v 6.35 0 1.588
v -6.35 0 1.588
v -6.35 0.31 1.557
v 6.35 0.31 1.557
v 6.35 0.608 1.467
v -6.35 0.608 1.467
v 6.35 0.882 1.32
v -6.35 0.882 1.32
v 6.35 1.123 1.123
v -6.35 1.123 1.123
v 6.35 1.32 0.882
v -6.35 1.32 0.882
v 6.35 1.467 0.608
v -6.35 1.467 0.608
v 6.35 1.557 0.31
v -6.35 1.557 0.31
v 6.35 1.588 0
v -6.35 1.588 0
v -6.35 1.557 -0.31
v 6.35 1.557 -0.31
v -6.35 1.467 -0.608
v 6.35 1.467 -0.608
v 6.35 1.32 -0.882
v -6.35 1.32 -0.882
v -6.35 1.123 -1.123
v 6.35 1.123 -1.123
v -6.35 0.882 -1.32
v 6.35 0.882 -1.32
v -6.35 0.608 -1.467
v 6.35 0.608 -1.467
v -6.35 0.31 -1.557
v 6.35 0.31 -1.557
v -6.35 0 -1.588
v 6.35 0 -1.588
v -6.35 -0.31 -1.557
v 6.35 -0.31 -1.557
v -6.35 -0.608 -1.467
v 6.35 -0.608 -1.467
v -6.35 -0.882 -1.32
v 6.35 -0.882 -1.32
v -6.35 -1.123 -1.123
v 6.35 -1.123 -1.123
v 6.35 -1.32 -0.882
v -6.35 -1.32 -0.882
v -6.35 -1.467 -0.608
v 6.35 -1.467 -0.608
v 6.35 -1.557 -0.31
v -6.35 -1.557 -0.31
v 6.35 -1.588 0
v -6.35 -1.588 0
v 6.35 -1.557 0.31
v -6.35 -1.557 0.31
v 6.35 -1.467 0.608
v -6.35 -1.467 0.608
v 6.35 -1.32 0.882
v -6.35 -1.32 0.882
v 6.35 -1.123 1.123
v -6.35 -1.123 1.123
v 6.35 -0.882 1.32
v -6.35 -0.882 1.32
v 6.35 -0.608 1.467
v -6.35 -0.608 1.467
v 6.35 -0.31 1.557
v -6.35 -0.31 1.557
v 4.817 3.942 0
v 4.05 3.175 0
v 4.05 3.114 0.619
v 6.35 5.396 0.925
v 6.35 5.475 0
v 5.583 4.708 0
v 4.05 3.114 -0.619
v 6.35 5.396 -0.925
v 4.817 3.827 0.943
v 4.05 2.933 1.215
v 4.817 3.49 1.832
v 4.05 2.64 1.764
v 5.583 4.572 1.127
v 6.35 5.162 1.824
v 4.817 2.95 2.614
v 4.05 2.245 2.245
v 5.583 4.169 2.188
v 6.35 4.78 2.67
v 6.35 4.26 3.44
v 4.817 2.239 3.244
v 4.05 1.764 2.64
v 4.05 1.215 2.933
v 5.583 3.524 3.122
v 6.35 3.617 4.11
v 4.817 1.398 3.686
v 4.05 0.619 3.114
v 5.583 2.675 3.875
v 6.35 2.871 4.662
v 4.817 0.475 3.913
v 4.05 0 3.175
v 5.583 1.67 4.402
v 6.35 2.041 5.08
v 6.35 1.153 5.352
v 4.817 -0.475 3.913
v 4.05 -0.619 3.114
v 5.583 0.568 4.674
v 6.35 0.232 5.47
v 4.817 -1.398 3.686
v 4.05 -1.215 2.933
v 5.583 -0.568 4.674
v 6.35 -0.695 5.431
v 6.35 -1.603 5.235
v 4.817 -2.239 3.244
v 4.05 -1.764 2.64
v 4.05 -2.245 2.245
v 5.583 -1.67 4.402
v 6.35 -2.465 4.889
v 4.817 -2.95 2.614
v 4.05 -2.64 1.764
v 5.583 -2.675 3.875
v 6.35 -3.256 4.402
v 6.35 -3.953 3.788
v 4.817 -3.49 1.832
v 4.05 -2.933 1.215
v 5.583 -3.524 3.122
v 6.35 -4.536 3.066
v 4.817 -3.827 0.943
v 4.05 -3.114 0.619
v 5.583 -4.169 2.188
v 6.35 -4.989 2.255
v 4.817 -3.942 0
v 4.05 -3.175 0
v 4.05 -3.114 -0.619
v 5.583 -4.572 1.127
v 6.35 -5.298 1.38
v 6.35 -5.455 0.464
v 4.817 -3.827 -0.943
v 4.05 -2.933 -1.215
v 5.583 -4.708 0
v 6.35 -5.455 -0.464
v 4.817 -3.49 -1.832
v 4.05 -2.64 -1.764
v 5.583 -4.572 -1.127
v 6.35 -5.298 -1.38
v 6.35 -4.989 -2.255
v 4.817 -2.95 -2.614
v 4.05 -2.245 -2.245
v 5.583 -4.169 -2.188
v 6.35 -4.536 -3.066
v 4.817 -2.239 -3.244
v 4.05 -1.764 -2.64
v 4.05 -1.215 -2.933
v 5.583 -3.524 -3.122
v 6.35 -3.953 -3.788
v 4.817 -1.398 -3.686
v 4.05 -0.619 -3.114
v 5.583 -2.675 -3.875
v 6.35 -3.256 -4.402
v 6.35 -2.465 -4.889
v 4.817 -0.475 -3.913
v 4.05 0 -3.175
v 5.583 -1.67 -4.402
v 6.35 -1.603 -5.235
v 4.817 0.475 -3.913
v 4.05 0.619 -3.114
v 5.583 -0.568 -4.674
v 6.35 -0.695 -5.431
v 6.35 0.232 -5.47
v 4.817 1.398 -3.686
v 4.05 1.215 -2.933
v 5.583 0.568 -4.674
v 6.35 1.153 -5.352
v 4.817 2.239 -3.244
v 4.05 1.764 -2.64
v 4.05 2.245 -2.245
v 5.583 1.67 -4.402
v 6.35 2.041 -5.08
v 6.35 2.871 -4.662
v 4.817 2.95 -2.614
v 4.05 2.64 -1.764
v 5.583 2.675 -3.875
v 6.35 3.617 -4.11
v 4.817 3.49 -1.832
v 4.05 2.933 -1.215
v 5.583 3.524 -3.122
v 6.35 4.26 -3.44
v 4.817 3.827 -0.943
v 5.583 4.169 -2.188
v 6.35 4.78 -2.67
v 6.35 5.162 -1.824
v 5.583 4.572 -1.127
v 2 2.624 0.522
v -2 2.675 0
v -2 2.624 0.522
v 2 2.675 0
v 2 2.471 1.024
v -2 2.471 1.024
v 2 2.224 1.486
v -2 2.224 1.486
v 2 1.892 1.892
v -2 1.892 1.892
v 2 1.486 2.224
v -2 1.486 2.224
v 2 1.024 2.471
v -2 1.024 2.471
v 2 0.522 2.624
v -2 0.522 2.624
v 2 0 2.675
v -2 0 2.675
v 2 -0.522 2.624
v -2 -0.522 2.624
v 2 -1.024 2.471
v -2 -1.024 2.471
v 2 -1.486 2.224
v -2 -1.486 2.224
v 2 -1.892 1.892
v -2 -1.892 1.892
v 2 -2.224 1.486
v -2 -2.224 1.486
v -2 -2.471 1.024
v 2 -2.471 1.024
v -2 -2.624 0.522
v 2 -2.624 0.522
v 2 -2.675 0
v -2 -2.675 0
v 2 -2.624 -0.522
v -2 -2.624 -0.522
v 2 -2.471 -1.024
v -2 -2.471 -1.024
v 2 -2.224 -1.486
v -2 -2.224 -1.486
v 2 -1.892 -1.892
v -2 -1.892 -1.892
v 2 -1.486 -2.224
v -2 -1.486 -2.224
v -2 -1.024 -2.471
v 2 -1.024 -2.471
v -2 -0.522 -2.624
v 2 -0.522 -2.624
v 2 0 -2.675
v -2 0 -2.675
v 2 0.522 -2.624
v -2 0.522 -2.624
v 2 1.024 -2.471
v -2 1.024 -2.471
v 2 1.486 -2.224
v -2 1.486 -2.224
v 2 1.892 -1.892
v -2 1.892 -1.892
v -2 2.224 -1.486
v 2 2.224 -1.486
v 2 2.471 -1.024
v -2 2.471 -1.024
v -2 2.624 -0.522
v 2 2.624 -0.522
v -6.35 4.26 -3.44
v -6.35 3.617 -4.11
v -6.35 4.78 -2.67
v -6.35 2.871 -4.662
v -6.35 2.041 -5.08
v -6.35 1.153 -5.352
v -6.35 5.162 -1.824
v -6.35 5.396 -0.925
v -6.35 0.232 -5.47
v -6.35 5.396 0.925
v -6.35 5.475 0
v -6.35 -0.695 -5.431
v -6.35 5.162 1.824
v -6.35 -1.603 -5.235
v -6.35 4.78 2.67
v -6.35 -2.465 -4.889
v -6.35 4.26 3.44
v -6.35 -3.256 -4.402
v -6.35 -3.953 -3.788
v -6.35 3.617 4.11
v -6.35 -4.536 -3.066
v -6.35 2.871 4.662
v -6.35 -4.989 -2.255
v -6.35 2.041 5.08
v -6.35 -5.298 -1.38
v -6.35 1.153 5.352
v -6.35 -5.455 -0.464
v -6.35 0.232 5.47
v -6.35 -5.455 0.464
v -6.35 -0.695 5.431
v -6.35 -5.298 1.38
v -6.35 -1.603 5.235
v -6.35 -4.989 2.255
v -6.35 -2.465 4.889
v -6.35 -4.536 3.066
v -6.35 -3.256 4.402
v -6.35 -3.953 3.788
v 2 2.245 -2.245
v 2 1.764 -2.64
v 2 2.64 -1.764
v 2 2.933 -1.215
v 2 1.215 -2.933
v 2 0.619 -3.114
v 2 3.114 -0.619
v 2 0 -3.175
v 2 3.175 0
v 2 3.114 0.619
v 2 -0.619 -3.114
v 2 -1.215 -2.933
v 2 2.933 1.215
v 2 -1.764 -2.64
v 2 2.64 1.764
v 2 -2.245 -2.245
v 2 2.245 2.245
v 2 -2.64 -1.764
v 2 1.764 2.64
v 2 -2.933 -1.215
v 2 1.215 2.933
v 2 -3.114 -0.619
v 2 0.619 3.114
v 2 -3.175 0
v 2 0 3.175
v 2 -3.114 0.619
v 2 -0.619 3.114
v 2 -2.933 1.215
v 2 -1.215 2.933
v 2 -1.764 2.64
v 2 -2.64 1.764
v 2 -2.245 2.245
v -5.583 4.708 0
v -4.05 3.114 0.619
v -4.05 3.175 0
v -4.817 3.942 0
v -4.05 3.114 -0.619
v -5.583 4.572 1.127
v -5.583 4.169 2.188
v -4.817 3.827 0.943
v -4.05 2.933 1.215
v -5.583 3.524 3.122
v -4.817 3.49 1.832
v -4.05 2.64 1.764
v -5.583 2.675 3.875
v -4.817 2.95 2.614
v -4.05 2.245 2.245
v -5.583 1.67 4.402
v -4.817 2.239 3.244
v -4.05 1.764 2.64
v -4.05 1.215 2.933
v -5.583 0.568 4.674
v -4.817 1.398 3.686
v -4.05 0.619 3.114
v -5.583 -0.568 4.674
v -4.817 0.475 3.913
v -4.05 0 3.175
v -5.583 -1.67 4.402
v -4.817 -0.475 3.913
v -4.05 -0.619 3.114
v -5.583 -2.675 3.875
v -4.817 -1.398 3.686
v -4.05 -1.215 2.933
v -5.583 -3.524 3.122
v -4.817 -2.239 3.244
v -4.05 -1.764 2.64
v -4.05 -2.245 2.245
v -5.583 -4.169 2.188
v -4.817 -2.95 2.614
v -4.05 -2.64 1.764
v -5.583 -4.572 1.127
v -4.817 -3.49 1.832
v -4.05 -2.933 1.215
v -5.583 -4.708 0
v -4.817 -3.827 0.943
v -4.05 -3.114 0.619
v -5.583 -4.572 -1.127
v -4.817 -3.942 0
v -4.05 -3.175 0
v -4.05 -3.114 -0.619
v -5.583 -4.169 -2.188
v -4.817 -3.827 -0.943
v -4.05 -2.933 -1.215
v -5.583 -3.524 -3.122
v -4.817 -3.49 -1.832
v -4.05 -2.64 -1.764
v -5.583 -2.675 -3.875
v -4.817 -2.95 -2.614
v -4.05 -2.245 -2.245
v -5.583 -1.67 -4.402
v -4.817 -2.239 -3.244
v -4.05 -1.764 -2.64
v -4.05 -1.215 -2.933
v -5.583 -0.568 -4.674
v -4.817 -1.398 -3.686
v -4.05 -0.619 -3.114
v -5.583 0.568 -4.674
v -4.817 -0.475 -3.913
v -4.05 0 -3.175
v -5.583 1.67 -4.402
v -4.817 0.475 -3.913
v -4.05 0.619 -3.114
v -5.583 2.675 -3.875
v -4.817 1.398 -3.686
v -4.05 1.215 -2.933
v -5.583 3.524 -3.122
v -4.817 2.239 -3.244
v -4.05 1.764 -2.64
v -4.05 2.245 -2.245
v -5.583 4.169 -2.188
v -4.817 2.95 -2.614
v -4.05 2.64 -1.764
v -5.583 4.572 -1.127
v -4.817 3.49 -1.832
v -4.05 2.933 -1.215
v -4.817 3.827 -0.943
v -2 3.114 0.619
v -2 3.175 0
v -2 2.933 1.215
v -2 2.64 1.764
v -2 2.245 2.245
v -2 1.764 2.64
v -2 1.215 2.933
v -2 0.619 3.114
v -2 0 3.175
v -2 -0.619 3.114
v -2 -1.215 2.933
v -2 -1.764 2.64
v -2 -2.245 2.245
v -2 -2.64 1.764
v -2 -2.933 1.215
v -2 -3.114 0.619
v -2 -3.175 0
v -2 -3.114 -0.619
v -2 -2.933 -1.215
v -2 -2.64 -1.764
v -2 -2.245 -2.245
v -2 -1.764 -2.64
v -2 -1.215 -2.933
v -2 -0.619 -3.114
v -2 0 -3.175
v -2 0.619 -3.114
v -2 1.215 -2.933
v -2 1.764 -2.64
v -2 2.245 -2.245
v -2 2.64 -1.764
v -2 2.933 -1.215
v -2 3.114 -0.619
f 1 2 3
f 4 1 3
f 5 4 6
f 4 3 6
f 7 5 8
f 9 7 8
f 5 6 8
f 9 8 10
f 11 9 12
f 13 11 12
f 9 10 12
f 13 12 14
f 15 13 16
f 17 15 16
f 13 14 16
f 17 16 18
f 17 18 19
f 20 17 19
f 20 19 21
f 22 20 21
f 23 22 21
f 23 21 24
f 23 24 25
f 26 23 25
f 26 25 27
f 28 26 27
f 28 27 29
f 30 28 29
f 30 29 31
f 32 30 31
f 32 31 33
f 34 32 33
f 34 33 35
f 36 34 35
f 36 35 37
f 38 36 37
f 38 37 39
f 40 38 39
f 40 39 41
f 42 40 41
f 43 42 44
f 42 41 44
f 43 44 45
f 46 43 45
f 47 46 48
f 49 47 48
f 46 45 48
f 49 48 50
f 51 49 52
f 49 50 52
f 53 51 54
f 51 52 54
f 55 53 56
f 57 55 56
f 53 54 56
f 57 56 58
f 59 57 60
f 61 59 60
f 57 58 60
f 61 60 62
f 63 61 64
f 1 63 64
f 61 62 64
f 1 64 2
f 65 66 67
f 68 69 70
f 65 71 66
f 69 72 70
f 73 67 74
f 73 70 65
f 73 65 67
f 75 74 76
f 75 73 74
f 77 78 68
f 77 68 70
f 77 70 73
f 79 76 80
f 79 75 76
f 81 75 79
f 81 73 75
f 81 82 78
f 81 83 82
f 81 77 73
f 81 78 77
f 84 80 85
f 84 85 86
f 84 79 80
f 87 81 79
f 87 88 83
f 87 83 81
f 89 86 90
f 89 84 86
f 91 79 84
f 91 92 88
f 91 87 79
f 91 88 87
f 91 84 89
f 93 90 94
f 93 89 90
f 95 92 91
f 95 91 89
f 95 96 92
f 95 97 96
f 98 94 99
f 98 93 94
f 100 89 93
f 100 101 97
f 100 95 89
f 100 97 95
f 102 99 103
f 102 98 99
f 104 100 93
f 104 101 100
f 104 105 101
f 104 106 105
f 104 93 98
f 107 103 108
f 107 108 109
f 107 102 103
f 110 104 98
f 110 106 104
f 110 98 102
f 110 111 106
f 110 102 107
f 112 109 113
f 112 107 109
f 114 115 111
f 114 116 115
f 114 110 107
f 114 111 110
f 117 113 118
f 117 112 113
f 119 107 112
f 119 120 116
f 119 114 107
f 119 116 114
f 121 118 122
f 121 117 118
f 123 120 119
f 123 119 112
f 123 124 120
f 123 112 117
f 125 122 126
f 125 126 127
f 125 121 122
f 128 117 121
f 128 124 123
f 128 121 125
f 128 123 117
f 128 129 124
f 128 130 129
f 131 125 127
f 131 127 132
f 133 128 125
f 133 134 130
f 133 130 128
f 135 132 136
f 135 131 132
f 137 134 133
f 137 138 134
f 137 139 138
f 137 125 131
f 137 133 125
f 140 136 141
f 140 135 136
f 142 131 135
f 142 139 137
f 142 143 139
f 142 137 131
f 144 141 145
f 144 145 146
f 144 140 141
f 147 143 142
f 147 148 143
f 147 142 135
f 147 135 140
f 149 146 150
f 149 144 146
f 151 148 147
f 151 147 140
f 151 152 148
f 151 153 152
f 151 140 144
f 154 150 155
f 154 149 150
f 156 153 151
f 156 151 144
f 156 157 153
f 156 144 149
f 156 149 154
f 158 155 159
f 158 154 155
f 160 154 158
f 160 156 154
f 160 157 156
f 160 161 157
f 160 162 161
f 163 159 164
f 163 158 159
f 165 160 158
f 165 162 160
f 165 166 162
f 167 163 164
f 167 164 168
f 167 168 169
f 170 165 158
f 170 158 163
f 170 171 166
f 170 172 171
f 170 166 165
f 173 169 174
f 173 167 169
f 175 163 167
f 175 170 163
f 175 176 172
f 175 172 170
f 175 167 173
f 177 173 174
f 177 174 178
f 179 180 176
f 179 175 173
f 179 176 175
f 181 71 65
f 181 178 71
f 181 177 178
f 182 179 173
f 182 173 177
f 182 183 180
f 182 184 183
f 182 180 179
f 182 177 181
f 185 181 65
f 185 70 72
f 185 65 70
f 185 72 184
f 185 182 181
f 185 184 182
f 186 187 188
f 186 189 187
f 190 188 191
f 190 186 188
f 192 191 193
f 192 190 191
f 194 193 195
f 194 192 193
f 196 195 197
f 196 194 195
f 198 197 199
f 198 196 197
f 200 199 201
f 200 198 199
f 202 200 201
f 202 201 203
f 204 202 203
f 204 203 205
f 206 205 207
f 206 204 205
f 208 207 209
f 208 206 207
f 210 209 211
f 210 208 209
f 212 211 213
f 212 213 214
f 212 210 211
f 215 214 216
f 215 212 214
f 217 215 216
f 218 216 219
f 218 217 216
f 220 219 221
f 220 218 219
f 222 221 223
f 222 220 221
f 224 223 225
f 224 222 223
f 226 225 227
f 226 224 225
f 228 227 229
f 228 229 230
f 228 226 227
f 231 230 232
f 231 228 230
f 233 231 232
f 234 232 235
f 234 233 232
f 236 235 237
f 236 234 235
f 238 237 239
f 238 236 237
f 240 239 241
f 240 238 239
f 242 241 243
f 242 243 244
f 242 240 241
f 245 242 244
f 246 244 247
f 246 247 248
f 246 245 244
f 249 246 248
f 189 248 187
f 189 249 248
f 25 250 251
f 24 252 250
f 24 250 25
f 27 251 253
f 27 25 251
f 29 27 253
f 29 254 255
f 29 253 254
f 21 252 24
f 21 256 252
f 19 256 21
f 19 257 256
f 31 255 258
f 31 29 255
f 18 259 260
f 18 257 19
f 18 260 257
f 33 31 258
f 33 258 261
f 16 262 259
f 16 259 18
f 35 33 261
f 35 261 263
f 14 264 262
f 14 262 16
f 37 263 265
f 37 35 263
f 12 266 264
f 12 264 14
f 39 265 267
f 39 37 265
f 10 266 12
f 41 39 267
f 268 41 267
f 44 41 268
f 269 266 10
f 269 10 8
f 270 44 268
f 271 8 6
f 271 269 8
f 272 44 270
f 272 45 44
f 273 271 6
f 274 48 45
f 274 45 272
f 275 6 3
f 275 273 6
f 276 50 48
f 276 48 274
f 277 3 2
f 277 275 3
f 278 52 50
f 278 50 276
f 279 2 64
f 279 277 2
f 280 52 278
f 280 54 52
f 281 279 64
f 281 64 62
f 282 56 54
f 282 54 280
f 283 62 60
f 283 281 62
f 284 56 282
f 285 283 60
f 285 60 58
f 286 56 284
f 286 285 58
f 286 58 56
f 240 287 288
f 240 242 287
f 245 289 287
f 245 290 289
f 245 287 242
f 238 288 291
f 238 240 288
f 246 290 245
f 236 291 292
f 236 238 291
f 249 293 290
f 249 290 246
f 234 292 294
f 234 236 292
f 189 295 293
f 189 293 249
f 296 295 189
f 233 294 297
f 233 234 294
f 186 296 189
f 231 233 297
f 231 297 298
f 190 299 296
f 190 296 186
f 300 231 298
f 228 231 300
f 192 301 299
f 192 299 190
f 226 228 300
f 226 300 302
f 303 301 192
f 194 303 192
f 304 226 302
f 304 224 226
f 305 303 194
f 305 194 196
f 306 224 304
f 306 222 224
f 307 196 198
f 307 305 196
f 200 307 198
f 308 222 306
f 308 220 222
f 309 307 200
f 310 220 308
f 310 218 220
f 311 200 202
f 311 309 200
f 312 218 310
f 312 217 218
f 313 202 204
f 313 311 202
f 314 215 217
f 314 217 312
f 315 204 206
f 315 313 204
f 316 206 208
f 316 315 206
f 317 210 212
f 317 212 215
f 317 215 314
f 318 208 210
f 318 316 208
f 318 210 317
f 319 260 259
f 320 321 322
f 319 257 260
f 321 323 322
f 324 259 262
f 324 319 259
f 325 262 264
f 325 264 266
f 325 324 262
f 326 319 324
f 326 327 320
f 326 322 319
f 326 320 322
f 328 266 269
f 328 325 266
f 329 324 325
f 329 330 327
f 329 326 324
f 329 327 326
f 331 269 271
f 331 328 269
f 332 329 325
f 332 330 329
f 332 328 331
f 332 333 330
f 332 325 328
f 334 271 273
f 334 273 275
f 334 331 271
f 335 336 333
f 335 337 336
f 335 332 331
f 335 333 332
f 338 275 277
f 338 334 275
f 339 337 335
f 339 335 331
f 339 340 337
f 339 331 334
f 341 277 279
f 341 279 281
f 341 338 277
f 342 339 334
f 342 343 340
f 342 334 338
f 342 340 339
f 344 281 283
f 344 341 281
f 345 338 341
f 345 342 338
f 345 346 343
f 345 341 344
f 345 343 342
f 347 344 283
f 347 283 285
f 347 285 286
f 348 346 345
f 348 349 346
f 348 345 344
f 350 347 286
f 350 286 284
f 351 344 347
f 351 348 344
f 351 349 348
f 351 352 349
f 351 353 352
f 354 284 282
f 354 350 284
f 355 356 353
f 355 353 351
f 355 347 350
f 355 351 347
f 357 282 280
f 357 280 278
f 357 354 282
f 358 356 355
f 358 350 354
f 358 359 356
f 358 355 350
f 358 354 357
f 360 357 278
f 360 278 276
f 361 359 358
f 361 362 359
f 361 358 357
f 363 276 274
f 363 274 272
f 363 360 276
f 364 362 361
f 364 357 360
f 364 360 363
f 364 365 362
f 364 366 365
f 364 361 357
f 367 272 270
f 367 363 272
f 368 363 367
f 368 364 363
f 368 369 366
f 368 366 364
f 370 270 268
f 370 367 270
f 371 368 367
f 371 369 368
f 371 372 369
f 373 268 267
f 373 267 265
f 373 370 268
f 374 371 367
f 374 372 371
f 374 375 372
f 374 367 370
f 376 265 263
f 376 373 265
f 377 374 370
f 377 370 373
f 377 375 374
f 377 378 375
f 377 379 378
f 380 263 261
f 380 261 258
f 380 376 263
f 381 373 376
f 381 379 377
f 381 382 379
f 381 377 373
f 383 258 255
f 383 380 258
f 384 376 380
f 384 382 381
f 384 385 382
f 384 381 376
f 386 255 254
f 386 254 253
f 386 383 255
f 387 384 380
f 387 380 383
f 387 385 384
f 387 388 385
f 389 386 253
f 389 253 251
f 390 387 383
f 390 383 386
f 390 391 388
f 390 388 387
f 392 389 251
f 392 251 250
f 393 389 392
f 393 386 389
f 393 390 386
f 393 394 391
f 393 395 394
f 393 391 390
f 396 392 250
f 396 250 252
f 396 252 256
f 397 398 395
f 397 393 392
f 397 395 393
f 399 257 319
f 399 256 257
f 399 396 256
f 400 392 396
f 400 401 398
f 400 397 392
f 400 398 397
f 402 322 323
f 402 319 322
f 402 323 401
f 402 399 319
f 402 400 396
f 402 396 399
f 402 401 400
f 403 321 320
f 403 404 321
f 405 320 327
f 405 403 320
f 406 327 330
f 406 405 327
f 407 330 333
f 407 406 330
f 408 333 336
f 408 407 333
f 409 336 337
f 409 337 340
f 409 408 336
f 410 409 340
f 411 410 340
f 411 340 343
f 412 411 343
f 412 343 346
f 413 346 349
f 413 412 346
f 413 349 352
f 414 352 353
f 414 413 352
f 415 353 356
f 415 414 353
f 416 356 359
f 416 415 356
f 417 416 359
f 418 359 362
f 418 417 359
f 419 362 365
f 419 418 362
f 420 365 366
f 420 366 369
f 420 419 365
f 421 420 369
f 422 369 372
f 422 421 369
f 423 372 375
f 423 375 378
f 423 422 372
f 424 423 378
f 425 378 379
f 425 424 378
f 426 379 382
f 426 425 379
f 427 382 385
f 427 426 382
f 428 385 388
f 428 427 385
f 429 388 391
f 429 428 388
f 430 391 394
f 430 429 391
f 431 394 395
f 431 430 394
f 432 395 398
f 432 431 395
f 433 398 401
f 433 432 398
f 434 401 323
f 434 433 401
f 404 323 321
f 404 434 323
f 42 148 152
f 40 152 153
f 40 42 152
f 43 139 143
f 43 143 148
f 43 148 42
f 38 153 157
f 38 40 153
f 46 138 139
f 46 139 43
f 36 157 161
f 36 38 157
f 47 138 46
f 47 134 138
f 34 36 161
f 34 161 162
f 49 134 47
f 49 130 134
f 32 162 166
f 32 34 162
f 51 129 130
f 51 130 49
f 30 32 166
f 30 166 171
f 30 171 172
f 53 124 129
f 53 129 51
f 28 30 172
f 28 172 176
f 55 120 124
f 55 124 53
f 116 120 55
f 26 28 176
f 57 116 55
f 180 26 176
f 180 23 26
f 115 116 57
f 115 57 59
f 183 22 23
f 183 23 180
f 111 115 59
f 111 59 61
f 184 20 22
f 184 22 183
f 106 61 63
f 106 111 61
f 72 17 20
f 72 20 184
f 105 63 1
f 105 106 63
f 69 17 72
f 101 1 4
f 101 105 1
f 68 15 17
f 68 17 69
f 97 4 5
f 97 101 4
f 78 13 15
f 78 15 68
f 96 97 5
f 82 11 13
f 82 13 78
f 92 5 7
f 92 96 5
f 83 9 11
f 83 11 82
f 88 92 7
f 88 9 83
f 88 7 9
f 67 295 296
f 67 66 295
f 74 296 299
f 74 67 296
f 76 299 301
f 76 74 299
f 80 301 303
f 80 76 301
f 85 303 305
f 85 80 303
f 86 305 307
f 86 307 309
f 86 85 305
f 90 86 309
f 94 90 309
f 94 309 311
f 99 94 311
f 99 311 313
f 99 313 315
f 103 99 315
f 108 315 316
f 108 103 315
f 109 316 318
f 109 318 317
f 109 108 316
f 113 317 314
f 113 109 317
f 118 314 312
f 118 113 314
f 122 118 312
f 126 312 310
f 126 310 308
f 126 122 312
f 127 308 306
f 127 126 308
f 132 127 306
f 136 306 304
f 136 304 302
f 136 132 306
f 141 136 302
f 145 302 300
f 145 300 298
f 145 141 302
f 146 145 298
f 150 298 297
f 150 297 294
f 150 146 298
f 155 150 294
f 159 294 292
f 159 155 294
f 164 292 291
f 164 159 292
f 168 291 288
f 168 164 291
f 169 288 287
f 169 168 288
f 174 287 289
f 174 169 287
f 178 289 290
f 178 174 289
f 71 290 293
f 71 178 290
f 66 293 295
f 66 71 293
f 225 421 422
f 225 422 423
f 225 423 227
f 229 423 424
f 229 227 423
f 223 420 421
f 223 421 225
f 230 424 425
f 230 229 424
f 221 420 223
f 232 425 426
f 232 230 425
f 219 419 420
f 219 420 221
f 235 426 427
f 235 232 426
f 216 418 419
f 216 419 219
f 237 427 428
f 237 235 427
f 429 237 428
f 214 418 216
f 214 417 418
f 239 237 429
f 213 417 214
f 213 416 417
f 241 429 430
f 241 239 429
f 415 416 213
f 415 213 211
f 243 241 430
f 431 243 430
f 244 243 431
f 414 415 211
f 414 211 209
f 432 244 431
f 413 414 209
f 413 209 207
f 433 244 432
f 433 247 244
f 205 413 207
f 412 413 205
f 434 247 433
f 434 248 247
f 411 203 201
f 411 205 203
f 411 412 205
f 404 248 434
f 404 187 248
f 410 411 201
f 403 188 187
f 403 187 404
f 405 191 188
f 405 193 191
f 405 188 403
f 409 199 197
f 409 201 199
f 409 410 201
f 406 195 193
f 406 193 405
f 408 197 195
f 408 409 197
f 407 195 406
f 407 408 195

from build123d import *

# Parameters (mm, degrees)
SKETCH2_R          = 1.5875
CUT_EXTRUDE1_DEPTH = 13.7


with BuildPart() as part:
    # Sketch1 → Revolve1 (revolve)
    with BuildSketch(Plane.XY):
        Polygon((-6.35, 0), (-6.35, 5.475), (-4.05, 3.175), (-2, 3.175), (-2, 2.675), (2, 2.675), (2, 3.175), (4.05, 3.175), (6.35, 5.475), (6.35, 0), align=None)
    revolve(axis=Axis((-93.951812963, 0, 0), (1, 0, 0)))

    # Sketch2 → Cut-Extrude1 (cut, through all)
    with BuildSketch(Plane.ZY.offset(6.35)):
        Circle(SKETCH2_R)
    extrude(amount=-CUT_EXTRUDE1_DEPTH, mode=Mode.SUBTRACT)


solid = part.part
